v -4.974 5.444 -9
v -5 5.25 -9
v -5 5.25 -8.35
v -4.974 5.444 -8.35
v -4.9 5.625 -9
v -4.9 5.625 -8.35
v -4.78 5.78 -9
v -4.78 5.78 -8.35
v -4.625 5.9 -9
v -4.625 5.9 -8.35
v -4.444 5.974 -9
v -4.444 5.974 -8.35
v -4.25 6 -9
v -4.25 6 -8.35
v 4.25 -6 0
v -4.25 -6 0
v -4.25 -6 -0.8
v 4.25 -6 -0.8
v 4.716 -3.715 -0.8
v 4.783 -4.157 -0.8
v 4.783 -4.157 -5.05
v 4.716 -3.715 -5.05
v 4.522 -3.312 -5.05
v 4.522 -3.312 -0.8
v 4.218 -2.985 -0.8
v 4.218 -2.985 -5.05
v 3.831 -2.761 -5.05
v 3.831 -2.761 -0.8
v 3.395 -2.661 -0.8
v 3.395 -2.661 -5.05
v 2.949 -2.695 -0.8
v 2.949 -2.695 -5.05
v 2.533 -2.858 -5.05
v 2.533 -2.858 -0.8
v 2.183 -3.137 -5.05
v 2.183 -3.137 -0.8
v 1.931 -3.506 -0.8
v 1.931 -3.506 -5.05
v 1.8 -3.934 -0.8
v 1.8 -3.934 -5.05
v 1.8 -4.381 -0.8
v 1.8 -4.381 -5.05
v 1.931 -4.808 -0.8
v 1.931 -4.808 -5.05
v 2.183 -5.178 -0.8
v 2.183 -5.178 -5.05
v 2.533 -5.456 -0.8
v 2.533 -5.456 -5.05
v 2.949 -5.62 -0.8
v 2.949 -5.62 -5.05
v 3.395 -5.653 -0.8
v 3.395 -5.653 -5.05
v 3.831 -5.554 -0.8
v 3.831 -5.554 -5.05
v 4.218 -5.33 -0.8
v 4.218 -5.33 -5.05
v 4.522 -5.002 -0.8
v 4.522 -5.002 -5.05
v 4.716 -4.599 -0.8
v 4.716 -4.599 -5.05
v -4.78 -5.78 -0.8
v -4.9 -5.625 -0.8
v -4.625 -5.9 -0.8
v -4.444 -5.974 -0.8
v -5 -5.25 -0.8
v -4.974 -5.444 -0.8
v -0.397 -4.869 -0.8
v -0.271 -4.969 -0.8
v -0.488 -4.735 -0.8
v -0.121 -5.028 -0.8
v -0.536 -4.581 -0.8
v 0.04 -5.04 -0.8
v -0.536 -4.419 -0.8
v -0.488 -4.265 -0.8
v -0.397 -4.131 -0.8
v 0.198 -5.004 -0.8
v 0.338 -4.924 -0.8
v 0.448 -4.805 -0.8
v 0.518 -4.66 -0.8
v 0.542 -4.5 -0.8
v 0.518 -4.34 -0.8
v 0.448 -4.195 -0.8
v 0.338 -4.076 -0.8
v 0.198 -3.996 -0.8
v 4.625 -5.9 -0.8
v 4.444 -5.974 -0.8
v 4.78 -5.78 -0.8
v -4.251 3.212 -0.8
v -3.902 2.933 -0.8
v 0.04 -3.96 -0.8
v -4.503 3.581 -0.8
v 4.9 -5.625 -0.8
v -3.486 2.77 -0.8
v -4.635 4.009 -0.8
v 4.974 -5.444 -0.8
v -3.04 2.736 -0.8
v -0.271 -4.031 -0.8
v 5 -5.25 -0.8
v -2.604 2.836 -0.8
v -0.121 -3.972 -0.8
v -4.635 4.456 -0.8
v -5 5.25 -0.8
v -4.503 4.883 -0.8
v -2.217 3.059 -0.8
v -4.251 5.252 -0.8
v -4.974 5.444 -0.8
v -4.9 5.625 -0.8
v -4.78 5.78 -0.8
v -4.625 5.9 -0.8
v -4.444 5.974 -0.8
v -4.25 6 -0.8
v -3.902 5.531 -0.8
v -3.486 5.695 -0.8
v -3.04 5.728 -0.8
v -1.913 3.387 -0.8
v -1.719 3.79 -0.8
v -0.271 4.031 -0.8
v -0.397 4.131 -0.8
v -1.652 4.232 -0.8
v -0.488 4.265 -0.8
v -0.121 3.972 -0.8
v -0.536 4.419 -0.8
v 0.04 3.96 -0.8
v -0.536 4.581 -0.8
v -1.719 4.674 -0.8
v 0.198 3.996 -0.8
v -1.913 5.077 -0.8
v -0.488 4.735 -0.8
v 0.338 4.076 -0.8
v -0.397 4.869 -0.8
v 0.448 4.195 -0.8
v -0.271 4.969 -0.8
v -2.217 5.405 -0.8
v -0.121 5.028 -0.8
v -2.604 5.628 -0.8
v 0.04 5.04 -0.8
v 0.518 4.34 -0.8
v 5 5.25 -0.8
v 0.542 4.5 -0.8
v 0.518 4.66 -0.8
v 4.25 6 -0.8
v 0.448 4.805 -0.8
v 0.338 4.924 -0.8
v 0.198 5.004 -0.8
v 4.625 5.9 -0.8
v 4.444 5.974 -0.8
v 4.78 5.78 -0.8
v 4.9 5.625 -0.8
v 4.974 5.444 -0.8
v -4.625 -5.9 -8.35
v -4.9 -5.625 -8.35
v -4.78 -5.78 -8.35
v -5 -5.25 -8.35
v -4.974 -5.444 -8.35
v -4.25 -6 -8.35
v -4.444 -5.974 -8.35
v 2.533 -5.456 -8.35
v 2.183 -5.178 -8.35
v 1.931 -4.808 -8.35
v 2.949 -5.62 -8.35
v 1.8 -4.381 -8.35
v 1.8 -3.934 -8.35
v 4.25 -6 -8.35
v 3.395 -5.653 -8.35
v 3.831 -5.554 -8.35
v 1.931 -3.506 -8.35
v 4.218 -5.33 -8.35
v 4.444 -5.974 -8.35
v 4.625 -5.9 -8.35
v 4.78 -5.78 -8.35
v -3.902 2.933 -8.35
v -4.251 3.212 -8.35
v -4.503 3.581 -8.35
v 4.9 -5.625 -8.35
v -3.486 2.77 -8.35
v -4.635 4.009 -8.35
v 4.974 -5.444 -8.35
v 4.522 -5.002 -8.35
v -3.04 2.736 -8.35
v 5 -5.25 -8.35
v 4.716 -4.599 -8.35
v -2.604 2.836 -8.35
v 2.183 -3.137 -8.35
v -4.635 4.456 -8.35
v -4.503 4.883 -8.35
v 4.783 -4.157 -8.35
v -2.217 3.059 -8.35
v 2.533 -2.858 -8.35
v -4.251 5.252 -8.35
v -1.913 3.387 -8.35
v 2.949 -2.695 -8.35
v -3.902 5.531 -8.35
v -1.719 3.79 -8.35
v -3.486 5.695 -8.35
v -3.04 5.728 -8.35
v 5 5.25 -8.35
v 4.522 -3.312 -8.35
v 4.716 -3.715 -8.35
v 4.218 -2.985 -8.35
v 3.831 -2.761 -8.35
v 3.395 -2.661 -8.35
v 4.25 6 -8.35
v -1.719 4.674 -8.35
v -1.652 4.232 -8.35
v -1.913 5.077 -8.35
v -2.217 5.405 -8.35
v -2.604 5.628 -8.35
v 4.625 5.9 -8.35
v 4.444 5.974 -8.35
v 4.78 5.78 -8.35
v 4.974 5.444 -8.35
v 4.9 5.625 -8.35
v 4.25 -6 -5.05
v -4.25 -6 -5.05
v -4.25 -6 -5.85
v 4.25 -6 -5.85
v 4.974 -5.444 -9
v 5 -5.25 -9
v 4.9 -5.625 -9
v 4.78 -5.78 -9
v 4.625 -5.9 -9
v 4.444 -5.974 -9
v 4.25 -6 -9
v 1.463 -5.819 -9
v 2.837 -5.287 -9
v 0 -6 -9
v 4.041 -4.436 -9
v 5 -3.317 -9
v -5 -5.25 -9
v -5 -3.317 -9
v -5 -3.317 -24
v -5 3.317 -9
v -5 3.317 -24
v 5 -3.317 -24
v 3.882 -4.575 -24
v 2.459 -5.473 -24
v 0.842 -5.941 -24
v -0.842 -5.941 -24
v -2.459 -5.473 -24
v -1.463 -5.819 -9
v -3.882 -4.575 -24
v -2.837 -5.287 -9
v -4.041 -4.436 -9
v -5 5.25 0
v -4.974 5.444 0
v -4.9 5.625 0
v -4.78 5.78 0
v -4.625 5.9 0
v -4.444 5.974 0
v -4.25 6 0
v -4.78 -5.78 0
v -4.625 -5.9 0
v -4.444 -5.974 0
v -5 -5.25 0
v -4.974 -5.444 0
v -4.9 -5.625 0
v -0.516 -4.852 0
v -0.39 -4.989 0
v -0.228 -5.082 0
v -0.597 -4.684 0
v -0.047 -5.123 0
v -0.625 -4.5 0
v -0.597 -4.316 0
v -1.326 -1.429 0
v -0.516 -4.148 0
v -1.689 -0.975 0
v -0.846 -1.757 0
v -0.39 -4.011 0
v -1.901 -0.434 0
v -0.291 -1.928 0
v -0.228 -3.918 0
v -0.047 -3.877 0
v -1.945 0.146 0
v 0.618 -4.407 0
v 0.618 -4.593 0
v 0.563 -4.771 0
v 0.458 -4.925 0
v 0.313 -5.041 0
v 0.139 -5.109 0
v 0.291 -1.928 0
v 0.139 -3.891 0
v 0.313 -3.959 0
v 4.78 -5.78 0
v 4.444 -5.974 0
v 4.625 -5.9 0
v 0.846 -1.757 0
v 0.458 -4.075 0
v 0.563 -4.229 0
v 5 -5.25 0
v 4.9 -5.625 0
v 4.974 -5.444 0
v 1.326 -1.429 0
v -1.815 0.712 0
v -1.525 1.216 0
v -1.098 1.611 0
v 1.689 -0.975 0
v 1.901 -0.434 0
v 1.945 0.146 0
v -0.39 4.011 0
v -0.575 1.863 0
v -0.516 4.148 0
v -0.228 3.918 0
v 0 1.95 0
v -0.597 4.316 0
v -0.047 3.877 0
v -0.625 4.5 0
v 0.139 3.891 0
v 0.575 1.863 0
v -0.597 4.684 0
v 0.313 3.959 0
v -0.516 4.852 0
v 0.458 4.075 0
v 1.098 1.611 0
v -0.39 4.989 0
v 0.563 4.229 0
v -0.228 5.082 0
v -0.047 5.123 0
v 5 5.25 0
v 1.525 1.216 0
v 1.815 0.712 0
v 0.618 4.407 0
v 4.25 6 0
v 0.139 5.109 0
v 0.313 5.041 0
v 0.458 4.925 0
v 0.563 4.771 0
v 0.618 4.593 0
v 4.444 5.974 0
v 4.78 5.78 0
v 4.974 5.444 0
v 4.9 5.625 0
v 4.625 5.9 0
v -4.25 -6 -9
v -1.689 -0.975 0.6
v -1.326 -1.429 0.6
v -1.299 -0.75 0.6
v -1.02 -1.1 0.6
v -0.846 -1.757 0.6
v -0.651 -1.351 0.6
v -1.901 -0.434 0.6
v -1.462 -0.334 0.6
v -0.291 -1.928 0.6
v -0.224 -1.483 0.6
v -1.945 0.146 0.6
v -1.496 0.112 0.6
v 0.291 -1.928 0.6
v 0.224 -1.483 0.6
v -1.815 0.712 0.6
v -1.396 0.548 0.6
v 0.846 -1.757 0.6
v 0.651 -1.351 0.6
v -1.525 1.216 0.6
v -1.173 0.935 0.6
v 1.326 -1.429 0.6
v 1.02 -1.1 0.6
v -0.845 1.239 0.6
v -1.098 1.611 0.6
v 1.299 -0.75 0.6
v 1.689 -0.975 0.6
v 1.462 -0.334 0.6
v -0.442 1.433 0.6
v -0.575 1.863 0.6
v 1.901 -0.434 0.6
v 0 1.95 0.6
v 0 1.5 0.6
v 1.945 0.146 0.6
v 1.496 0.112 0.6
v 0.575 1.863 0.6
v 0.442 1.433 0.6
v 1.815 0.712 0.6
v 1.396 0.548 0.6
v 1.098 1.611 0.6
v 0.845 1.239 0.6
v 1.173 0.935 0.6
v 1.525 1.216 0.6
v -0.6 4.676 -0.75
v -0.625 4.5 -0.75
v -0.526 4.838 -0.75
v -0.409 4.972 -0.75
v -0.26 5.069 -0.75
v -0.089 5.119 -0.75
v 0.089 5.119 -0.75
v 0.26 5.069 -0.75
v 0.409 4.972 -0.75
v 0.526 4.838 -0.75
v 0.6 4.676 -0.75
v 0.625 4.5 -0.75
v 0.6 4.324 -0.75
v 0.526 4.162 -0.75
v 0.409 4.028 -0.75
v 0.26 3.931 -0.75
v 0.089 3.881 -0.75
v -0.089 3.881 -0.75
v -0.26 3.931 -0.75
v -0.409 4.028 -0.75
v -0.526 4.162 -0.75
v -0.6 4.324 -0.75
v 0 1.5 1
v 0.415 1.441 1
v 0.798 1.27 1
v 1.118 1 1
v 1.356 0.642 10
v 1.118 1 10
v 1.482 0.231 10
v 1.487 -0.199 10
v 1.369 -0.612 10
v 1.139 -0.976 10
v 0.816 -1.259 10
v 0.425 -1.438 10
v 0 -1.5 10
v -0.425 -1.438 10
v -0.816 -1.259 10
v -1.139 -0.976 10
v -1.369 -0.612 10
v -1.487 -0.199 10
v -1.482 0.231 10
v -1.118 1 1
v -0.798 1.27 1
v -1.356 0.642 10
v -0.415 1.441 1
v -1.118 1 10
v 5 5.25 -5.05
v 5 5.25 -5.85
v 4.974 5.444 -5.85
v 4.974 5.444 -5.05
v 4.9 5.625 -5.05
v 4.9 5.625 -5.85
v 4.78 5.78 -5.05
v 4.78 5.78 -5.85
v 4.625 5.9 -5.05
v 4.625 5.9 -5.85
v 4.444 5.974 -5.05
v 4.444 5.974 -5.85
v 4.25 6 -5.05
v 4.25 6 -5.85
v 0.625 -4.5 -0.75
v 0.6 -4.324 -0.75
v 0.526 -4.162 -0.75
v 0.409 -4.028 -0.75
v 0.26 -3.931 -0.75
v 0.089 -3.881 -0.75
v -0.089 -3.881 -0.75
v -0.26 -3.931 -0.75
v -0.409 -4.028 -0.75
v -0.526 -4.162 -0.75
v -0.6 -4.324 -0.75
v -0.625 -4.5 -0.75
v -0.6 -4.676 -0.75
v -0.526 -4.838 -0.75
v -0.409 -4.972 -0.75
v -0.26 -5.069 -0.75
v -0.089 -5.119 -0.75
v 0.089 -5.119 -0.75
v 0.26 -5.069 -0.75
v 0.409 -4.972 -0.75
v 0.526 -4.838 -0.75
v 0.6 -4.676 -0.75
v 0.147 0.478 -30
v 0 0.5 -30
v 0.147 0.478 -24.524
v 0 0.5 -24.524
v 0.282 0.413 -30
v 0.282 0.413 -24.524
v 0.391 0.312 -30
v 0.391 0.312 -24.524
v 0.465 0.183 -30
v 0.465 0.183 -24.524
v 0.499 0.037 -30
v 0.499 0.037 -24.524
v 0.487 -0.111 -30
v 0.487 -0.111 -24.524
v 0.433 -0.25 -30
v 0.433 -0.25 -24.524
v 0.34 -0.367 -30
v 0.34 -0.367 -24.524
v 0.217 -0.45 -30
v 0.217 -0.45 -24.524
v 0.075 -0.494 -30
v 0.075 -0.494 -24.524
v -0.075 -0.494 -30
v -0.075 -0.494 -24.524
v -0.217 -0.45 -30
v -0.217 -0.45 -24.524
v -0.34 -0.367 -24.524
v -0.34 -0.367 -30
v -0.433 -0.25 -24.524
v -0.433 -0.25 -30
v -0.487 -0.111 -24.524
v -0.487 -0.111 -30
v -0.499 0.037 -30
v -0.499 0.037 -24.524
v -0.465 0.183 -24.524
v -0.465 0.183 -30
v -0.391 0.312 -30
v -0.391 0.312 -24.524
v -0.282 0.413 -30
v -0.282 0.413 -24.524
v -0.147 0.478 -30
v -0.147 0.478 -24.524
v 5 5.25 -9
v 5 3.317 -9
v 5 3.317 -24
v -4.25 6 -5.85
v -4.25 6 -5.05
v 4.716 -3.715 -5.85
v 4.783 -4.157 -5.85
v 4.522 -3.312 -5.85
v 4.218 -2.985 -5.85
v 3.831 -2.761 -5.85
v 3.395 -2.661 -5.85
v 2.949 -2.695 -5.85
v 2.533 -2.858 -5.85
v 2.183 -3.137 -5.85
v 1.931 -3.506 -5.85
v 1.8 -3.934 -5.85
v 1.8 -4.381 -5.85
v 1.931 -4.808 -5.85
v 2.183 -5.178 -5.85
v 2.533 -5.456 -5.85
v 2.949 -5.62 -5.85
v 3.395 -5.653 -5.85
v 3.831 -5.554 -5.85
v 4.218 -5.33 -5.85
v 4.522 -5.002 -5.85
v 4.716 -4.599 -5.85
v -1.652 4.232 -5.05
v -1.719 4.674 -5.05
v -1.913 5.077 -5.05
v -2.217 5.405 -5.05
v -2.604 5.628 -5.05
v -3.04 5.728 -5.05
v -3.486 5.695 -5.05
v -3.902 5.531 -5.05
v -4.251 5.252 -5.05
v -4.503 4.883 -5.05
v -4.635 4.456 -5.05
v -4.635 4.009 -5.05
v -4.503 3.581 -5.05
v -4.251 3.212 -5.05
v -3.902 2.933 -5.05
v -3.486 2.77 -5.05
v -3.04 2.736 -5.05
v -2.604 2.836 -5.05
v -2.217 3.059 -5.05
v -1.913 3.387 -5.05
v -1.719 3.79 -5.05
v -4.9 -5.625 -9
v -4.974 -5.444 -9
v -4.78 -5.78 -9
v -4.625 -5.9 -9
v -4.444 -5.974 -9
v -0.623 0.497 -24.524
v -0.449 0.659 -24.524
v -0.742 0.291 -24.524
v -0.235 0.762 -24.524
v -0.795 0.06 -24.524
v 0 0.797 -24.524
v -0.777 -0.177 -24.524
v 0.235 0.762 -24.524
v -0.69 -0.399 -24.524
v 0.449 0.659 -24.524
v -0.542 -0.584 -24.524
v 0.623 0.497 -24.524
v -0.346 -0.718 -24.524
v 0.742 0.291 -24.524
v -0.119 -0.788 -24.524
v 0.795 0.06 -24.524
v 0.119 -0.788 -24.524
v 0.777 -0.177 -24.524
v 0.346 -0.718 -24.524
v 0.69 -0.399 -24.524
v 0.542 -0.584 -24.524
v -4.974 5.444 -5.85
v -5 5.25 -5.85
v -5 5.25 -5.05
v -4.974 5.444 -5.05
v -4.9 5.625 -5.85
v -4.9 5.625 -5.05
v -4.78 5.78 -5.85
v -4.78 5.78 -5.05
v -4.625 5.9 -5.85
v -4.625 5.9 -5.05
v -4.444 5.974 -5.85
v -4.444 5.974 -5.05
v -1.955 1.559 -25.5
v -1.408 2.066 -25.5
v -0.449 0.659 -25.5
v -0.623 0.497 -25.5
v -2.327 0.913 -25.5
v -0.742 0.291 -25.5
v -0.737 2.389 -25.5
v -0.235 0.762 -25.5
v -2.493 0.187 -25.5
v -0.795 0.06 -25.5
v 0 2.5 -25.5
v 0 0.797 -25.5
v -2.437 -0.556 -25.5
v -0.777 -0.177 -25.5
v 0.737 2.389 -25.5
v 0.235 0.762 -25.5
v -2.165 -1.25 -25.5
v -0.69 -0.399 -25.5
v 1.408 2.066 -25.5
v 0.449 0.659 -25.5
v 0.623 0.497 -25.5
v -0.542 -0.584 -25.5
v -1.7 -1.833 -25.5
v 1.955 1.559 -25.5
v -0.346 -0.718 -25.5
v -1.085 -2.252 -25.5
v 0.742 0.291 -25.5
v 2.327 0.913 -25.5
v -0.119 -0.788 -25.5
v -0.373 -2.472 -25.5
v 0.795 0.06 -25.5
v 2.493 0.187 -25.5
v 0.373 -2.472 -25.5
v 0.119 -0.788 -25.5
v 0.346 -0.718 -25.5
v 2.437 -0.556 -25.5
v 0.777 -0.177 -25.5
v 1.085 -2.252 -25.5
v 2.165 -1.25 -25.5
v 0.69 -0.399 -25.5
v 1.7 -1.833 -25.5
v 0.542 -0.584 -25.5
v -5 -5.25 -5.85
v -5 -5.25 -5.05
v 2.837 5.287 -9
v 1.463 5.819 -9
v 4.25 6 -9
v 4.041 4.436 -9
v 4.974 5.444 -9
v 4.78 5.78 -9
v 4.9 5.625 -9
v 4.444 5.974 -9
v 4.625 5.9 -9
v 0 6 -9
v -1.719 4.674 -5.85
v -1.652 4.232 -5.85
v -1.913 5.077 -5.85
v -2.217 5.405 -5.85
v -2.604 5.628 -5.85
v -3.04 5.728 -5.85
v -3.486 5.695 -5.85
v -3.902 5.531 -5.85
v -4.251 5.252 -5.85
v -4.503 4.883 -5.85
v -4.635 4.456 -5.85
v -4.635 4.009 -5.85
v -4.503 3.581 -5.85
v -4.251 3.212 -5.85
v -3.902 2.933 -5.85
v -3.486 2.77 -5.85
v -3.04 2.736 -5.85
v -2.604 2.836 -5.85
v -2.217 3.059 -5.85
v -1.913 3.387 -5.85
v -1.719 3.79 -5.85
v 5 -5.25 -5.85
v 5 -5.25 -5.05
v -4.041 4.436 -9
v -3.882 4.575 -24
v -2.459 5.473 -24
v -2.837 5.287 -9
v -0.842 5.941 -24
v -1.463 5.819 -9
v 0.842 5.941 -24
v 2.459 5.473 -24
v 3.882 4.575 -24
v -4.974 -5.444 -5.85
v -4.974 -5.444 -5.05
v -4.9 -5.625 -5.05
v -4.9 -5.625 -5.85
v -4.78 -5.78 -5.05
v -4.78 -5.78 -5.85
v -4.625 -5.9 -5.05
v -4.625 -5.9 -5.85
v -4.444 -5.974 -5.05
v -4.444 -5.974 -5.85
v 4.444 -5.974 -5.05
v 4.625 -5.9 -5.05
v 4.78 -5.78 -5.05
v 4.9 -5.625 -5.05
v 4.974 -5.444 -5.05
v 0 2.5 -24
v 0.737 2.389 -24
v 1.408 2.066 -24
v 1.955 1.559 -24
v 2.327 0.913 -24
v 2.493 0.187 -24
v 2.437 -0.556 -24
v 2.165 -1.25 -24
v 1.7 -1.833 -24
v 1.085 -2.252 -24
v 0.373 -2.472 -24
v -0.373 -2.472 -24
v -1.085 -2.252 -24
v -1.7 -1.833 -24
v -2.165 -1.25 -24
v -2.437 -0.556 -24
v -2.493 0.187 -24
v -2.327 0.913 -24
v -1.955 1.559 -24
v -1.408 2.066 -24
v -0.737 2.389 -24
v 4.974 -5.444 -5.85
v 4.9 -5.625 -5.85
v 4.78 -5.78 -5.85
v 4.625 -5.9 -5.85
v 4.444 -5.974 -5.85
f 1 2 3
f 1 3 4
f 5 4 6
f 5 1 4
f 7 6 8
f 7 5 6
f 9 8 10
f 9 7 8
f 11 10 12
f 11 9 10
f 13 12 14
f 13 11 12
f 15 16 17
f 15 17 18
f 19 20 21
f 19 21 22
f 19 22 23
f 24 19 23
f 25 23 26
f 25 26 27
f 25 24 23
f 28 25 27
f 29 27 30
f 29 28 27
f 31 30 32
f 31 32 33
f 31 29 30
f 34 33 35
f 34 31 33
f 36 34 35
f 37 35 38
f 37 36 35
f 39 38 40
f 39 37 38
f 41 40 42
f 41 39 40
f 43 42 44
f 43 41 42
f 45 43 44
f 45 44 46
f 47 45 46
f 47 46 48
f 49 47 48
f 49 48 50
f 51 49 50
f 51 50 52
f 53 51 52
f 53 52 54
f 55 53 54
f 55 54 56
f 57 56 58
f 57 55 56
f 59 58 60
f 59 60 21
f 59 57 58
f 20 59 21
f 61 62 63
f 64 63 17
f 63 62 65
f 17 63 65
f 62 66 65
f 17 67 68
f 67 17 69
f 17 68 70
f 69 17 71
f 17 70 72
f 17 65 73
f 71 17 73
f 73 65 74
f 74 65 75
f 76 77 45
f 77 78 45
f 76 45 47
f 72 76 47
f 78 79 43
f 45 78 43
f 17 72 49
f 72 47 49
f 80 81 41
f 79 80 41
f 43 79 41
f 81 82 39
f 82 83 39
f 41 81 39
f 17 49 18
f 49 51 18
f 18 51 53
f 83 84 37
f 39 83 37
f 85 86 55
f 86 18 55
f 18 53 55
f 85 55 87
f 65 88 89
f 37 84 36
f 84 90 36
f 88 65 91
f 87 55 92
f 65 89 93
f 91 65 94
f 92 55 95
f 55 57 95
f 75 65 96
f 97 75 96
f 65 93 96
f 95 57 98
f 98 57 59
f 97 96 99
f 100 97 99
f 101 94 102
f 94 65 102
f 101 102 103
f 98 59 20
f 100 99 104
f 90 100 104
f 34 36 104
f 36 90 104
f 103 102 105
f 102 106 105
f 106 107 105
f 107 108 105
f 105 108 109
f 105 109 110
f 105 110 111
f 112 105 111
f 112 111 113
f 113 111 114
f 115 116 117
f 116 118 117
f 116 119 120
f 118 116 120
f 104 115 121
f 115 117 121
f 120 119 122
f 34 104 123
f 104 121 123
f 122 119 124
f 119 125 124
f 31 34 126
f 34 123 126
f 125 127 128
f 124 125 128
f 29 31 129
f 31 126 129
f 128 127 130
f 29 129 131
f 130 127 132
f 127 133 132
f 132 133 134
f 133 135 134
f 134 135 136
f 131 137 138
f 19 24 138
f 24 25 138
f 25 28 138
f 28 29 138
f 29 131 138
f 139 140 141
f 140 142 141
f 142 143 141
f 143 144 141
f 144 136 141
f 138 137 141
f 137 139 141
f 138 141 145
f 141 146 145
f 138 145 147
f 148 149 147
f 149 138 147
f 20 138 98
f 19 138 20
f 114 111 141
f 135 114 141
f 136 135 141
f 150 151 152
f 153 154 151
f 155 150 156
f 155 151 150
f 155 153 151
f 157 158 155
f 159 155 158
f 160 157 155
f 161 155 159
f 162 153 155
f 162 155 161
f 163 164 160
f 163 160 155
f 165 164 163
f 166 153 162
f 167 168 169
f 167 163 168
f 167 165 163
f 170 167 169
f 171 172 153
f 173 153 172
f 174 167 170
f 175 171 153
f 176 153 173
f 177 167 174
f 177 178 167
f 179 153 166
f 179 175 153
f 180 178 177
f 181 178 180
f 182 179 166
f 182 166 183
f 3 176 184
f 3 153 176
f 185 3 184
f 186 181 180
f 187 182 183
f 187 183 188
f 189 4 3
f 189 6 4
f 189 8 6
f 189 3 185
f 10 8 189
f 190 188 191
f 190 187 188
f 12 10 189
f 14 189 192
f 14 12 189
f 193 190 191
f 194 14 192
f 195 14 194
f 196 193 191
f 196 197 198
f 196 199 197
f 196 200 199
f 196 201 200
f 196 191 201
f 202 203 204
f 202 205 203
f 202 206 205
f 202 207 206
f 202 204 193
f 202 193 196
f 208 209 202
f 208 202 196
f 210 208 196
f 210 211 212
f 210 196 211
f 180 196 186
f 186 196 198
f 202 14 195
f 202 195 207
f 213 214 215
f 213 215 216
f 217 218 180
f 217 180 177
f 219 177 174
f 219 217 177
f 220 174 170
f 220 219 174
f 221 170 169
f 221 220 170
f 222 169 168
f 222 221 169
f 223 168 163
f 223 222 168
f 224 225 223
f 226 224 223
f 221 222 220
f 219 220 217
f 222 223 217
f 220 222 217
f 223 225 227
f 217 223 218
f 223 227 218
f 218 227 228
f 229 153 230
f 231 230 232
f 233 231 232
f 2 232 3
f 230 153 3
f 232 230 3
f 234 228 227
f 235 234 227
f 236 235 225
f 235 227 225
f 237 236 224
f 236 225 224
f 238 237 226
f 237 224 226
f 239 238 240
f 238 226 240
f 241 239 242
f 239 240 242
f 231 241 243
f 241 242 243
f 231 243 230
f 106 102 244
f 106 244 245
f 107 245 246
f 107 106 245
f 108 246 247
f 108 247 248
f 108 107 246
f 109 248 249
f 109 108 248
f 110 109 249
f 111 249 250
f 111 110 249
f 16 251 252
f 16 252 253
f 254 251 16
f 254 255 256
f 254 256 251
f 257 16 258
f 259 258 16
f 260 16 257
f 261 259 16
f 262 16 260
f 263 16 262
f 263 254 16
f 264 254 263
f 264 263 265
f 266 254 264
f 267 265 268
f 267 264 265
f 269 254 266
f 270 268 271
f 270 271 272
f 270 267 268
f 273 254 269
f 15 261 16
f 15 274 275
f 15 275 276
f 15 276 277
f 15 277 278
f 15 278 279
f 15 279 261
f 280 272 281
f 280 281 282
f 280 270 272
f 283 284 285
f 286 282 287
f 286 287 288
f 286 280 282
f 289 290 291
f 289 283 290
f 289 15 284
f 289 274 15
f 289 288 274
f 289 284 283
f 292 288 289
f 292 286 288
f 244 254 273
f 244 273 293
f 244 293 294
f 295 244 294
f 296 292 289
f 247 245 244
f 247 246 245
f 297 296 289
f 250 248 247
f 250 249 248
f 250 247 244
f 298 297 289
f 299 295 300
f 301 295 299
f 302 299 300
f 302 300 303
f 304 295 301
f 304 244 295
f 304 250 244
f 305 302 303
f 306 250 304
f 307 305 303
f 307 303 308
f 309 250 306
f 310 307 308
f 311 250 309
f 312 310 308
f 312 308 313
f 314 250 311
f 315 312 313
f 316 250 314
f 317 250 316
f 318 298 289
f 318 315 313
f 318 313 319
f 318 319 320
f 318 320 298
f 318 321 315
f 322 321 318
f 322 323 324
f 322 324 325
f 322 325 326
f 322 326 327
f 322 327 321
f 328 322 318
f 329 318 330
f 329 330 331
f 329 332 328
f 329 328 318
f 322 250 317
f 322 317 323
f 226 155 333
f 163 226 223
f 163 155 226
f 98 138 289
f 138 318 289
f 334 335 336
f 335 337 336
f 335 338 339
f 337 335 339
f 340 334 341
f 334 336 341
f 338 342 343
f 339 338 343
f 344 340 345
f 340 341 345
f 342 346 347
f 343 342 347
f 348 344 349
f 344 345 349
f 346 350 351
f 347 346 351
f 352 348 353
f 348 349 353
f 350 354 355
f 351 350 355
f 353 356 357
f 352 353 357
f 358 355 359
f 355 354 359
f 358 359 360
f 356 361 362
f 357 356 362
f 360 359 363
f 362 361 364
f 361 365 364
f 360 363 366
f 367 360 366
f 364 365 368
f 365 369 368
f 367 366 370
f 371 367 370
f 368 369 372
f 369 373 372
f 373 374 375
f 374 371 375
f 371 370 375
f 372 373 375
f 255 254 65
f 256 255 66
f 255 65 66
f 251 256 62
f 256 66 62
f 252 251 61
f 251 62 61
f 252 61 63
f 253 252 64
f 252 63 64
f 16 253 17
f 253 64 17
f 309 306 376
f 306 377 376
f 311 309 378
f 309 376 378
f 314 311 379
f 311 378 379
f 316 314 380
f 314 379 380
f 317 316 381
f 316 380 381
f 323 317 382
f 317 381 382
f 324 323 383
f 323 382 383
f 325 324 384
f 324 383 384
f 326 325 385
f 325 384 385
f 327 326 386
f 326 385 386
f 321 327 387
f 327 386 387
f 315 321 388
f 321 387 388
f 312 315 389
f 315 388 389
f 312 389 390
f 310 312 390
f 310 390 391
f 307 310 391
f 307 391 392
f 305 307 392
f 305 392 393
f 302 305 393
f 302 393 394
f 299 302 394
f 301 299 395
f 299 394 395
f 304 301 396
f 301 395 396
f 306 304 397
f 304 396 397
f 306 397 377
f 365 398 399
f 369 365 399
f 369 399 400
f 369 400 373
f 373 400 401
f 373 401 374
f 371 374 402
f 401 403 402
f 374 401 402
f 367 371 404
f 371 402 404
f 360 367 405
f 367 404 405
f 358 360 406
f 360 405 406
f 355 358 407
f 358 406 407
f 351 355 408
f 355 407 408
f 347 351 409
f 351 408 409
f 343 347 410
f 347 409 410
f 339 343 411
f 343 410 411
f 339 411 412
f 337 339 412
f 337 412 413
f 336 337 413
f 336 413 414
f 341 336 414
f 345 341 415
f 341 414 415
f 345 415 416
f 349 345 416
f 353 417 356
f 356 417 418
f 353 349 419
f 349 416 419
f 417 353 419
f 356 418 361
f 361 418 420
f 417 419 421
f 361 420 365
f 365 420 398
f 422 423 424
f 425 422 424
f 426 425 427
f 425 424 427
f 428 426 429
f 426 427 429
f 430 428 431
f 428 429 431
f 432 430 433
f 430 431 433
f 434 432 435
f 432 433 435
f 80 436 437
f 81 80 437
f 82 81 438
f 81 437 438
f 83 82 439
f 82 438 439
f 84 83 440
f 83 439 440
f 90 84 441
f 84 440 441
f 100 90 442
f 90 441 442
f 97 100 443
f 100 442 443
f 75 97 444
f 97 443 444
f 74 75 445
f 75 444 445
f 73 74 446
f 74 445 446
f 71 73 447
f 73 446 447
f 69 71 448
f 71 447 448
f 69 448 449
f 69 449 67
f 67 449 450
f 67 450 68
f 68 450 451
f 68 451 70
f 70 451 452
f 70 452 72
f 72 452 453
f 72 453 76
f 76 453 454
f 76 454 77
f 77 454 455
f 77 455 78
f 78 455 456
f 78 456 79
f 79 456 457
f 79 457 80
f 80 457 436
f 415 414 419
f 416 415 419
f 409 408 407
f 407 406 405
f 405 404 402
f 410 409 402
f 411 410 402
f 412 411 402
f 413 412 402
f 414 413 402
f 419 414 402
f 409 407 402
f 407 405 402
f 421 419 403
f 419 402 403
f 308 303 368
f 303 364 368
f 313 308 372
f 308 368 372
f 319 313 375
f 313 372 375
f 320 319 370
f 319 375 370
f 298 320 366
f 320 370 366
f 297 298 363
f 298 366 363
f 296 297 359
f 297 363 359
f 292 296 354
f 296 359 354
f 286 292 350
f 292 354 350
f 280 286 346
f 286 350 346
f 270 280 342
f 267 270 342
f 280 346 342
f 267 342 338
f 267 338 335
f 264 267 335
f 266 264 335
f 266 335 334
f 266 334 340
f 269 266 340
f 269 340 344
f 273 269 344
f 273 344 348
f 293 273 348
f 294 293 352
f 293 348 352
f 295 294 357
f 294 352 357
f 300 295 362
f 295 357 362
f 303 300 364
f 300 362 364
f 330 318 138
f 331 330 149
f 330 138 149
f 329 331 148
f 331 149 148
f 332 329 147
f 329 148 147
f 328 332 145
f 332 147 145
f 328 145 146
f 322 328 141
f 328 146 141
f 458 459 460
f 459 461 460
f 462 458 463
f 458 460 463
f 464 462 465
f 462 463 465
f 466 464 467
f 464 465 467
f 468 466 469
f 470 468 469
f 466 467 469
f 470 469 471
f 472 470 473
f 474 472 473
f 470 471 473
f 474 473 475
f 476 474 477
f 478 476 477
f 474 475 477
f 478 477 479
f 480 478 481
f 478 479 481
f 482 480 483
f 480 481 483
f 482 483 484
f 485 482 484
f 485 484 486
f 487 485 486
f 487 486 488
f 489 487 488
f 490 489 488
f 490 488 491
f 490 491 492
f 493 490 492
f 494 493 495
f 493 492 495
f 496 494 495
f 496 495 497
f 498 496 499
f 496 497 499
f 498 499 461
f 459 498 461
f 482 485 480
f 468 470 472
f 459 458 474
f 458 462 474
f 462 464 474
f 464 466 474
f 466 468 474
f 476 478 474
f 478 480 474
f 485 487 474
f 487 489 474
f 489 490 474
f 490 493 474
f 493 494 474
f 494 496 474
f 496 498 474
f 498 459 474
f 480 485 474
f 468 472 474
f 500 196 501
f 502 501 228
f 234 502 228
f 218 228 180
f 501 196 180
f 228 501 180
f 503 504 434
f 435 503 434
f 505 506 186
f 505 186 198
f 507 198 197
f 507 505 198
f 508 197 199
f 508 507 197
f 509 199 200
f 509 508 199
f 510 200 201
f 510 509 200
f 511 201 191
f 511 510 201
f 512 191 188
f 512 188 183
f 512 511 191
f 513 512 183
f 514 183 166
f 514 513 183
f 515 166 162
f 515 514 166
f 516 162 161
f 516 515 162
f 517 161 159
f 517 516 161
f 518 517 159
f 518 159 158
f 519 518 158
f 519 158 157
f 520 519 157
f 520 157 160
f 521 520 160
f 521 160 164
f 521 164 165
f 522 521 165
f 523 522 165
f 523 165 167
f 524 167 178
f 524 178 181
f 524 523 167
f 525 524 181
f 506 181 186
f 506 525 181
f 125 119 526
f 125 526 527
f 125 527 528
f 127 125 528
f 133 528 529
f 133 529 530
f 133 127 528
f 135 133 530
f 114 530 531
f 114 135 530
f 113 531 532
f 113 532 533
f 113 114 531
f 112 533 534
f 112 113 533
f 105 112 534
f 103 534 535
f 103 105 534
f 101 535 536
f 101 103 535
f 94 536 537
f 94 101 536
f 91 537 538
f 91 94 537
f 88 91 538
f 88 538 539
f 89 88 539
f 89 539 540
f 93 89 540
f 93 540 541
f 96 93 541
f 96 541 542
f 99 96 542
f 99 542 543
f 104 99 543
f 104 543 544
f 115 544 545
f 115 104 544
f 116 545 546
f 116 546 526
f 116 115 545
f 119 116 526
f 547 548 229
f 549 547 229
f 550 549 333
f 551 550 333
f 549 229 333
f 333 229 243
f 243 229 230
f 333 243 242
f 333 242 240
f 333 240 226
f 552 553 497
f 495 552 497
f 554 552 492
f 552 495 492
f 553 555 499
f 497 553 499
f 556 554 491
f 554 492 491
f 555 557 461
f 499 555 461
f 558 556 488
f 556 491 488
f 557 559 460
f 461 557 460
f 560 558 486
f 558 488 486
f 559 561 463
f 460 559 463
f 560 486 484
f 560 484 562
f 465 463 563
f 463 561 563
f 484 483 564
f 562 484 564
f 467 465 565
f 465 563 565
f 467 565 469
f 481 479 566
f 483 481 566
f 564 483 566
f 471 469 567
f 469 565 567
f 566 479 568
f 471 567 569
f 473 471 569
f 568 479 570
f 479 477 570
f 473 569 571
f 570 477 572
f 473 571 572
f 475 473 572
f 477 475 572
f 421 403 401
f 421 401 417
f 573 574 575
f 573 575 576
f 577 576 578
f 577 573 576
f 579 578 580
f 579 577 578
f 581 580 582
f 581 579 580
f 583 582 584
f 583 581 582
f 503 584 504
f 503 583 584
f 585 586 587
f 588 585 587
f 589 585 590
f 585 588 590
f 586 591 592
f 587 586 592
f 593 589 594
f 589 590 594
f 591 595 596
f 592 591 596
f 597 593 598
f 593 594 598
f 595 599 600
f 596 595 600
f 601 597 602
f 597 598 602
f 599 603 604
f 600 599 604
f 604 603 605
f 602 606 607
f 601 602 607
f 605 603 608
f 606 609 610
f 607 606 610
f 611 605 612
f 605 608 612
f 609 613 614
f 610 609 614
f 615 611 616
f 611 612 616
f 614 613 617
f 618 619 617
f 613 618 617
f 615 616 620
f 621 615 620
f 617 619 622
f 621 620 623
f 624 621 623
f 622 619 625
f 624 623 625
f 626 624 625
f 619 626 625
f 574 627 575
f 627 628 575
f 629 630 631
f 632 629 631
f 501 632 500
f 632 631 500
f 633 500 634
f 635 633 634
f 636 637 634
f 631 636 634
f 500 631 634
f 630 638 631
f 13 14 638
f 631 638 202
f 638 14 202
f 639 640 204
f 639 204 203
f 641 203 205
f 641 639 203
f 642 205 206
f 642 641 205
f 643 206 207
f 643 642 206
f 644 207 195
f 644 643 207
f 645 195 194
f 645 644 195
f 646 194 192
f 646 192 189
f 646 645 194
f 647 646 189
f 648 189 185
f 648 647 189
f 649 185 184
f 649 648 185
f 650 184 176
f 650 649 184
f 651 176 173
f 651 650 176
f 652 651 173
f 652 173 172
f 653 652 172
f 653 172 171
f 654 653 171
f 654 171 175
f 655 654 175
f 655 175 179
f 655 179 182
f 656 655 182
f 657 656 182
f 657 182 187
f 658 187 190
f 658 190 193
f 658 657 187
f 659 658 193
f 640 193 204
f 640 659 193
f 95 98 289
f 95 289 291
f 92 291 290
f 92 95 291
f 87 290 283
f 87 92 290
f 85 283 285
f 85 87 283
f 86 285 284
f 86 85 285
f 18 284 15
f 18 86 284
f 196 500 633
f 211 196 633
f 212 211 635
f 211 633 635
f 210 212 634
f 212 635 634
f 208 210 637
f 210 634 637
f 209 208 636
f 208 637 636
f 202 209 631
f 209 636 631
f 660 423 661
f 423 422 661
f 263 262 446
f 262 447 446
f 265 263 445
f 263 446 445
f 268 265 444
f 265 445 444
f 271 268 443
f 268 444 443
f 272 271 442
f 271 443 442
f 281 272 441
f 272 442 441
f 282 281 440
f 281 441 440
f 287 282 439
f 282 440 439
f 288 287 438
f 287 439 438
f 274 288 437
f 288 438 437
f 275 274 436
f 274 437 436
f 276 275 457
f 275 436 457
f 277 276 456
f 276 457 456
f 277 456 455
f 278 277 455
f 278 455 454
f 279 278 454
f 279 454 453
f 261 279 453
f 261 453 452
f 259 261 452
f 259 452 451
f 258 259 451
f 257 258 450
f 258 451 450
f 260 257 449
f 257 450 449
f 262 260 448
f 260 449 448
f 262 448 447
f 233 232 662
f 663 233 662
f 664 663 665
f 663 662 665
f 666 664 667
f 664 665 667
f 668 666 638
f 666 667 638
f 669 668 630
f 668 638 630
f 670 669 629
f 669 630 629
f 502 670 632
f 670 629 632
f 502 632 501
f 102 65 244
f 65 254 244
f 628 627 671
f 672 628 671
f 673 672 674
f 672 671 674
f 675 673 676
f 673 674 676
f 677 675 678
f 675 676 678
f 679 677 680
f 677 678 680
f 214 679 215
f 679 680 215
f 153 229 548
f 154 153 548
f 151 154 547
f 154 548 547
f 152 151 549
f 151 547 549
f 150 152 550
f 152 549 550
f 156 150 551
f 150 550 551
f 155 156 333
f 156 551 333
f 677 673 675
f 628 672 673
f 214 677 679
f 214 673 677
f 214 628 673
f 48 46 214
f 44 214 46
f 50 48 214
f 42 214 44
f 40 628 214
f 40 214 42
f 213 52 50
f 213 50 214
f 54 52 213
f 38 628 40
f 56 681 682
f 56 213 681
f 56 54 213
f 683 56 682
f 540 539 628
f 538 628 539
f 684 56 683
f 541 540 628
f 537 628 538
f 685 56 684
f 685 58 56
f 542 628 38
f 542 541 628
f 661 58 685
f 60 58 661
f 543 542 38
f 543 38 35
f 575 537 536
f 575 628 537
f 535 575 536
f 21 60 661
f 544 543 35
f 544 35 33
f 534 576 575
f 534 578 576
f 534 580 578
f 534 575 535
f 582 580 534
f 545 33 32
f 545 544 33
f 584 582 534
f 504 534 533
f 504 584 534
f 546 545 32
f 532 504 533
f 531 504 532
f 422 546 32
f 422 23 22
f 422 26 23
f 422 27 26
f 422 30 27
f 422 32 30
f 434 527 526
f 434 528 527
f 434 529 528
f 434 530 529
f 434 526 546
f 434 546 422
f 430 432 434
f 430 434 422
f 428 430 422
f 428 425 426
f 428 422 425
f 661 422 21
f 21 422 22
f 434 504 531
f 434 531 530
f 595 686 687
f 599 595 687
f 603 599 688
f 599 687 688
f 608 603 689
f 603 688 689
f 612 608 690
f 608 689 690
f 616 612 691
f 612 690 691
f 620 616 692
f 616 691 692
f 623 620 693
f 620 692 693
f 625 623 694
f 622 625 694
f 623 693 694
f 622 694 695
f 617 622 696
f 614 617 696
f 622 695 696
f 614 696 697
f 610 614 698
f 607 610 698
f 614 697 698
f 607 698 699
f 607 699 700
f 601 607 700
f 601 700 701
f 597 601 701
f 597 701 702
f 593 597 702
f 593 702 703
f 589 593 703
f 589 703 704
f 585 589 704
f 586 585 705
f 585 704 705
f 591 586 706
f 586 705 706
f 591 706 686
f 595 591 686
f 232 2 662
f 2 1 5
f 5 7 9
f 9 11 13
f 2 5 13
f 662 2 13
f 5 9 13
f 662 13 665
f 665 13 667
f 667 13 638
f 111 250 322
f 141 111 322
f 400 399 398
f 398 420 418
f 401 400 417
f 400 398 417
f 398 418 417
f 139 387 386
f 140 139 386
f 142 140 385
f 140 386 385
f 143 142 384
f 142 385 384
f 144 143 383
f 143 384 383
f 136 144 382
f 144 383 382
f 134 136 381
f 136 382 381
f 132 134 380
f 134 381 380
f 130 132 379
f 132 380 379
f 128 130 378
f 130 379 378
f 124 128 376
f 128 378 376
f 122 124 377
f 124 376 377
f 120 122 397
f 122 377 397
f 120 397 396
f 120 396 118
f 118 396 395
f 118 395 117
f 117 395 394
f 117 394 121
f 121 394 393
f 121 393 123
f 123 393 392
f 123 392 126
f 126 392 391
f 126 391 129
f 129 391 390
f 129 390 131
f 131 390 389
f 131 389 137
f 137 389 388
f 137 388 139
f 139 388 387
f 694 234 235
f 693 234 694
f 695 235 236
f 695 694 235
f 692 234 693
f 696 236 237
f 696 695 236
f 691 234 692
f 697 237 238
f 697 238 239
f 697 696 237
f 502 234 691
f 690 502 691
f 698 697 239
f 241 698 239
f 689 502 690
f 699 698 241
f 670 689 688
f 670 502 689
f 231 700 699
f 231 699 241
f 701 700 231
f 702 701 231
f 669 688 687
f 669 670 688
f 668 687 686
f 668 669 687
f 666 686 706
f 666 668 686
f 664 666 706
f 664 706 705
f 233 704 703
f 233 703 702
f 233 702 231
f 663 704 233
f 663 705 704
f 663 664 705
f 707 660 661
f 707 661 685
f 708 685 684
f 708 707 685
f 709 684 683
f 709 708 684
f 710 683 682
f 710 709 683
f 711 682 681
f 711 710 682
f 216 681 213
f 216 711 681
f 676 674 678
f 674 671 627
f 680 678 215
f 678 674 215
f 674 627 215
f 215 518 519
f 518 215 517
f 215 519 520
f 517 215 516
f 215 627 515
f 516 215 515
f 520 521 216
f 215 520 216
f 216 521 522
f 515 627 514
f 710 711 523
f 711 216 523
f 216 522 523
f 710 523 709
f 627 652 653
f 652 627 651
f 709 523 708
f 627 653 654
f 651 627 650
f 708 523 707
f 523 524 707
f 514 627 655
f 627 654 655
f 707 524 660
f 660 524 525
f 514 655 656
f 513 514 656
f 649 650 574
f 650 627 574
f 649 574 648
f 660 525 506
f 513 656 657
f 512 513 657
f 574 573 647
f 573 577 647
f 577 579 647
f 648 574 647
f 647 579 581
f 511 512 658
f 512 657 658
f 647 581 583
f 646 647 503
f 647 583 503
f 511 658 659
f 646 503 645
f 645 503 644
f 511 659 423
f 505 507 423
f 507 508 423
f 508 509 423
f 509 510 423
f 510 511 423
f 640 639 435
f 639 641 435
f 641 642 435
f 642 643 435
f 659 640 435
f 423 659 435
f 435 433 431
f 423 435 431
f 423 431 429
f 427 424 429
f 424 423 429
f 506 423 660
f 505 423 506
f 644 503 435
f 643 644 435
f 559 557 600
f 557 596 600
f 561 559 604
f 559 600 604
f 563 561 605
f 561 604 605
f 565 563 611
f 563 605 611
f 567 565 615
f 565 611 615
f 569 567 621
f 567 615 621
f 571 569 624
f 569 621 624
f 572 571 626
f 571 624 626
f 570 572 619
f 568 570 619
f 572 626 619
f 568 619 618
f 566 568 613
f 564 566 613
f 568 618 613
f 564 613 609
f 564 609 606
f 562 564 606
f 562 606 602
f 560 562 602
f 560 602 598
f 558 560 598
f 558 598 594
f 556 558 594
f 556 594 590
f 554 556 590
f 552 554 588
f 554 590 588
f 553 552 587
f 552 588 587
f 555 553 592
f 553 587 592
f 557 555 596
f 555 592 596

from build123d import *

# Parameters (mm, degrees)
SKETCH1_W                    = 10
SKETCH1_H                    = 12
BOSS_EXTRUDE1_DEPTH          = 9
BOSS_EXTRUDE2_DEPTH          = 15
CUT_EXTRUDE1_DEPTH           = 9
FILLET1_R                    = 0.75
M1_6X0_35_TAPPED_HOLE1_D     = 1.25
M1_6X0_35_TAPPED_HOLE1_DEPTH = 0.75
M1_6X0_35_TAPPED_HOLE1_TIP   = 0.375537887
CUT_EXTRUDE2_START           = -0.8
SKETCH7_W                    = 10
SKETCH7_H                    = 12
SKETCH7_R                    = 1.5
CUT_EXTRUDE2_DEPTH           = 4.25
CUT_EXTRUDE3_START           = -0.8
SKETCH8_W                    = 10
SKETCH8_H                    = 12
SKETCH8_R                    = 1.5
CUT_EXTRUDE3_DEPTH           = 2.5


with BuildPart() as part:
    # Sketch1 → Boss-Extrude1 (new body)
    with BuildSketch(Plane.XY):
        Rectangle(SKETCH1_W, SKETCH1_H)
    extrude(amount=-BOSS_EXTRUDE1_DEPTH)

    # Sketch2 → Boss-Extrude2 (add)
    with BuildSketch(Plane(origin=(0, 0, -9), x_dir=(-1, 0, 0), z_dir=(0, 0, -1))):
        with BuildLine():
            Line((-5, 3.31662479), (-5, -3.31662479))
            ThreePointArc((-5, -3.31662479), (0, -6), (5, -3.31662479))
            Line((5, -3.31662479), (5, 3.31662479))
            ThreePointArc((5, 3.31662479), (0, 6), (-5, 3.31662479))
        make_face()
    extrude(amount=BOSS_EXTRUDE2_DEPTH)

    # Sketch3 → Revolve1 (revolve)
    with BuildSketch(Plane(origin=(0, 0, 0), x_dir=(0, 0, -1), z_dir=(1, 0, 0))):
        Polygon((-10, 0), (30, 0), (30, 0.5), (24.524329041, 0.5), (24.524329041, 0.797163214), (25.5, 0.797163214), (25.5, 2.5), (0, 2.5), (0, 1.95), (-0.6, 1.95), (-0.6, 1.5), (-10, 1.5), align=None)
    revolve(axis=Axis((0, 0, 10), (0, 0, -1)))

    # Sketch4 → Cut-Extrude1 (cut)
    with BuildSketch(Plane.XY.offset(10)):
        with BuildLine():
            Line((1.118033989, 1), (-1.118033989, 1))
            ThreePointArc((-1.118033989, 1), (0, 1.5), (1.118033989, 1))
        make_face()
    extrude(amount=-CUT_EXTRUDE1_DEPTH, mode=Mode.SUBTRACT)

    # Fillet1
    fillet1_edges = [part.edges().sort_by_distance(p)[0] for p in [
        (-5, -6, -4.5),
        (5, -6, -4.5),
        (5, 6, -4.5),
        (-5, 6, -4.5),
    ]]
    fillet(fillet1_edges, radius=FILLET1_R)

    # M1.6x0.35 Tapped Hole1
    with Locations(Plane.XY):
        with Locations((0, -4.5), (0, 4.5)):
            Hole(M1_6X0_35_TAPPED_HOLE1_D / 2, depth=M1_6X0_35_TAPPED_HOLE1_DEPTH)
            with Locations((0, 0, -(M1_6X0_35_TAPPED_HOLE1_DEPTH + M1_6X0_35_TAPPED_HOLE1_TIP / 2))):  # 118° drill point
                Cone(0, M1_6X0_35_TAPPED_HOLE1_D / 2, M1_6X0_35_TAPPED_HOLE1_TIP, mode=Mode.SUBTRACT)

    # Sketch7 → Cut-Extrude2 (cut)
    with BuildSketch(Plane.XY.offset(CUT_EXTRUDE2_START)):
        Rectangle(SKETCH7_W, SKETCH7_H)
        with Locations((-3.151875275, 4.232117394)):
            Circle(SKETCH7_R, mode=Mode.SUBTRACT)
        with Locations((3.282813714, -4.157295429)):
            Circle(SKETCH7_R, mode=Mode.SUBTRACT)
    extrude(amount=-CUT_EXTRUDE2_DEPTH, mode=Mode.SUBTRACT)

    # Sketch8 → Cut-Extrude3 (cut)
    with BuildSketch(Plane.XY.offset(-5.05).offset(CUT_EXTRUDE3_START)):
        Rectangle(SKETCH8_W, SKETCH8_H)
        with Locations((-3.151875275, 4.232117394)):
            Circle(SKETCH8_R, mode=Mode.SUBTRACT)
        with Locations((3.282813714, -4.157295429)):
            Circle(SKETCH8_R, mode=Mode.SUBTRACT)
    extrude(amount=-CUT_EXTRUDE3_DEPTH, mode=Mode.SUBTRACT)


solid = part.part
